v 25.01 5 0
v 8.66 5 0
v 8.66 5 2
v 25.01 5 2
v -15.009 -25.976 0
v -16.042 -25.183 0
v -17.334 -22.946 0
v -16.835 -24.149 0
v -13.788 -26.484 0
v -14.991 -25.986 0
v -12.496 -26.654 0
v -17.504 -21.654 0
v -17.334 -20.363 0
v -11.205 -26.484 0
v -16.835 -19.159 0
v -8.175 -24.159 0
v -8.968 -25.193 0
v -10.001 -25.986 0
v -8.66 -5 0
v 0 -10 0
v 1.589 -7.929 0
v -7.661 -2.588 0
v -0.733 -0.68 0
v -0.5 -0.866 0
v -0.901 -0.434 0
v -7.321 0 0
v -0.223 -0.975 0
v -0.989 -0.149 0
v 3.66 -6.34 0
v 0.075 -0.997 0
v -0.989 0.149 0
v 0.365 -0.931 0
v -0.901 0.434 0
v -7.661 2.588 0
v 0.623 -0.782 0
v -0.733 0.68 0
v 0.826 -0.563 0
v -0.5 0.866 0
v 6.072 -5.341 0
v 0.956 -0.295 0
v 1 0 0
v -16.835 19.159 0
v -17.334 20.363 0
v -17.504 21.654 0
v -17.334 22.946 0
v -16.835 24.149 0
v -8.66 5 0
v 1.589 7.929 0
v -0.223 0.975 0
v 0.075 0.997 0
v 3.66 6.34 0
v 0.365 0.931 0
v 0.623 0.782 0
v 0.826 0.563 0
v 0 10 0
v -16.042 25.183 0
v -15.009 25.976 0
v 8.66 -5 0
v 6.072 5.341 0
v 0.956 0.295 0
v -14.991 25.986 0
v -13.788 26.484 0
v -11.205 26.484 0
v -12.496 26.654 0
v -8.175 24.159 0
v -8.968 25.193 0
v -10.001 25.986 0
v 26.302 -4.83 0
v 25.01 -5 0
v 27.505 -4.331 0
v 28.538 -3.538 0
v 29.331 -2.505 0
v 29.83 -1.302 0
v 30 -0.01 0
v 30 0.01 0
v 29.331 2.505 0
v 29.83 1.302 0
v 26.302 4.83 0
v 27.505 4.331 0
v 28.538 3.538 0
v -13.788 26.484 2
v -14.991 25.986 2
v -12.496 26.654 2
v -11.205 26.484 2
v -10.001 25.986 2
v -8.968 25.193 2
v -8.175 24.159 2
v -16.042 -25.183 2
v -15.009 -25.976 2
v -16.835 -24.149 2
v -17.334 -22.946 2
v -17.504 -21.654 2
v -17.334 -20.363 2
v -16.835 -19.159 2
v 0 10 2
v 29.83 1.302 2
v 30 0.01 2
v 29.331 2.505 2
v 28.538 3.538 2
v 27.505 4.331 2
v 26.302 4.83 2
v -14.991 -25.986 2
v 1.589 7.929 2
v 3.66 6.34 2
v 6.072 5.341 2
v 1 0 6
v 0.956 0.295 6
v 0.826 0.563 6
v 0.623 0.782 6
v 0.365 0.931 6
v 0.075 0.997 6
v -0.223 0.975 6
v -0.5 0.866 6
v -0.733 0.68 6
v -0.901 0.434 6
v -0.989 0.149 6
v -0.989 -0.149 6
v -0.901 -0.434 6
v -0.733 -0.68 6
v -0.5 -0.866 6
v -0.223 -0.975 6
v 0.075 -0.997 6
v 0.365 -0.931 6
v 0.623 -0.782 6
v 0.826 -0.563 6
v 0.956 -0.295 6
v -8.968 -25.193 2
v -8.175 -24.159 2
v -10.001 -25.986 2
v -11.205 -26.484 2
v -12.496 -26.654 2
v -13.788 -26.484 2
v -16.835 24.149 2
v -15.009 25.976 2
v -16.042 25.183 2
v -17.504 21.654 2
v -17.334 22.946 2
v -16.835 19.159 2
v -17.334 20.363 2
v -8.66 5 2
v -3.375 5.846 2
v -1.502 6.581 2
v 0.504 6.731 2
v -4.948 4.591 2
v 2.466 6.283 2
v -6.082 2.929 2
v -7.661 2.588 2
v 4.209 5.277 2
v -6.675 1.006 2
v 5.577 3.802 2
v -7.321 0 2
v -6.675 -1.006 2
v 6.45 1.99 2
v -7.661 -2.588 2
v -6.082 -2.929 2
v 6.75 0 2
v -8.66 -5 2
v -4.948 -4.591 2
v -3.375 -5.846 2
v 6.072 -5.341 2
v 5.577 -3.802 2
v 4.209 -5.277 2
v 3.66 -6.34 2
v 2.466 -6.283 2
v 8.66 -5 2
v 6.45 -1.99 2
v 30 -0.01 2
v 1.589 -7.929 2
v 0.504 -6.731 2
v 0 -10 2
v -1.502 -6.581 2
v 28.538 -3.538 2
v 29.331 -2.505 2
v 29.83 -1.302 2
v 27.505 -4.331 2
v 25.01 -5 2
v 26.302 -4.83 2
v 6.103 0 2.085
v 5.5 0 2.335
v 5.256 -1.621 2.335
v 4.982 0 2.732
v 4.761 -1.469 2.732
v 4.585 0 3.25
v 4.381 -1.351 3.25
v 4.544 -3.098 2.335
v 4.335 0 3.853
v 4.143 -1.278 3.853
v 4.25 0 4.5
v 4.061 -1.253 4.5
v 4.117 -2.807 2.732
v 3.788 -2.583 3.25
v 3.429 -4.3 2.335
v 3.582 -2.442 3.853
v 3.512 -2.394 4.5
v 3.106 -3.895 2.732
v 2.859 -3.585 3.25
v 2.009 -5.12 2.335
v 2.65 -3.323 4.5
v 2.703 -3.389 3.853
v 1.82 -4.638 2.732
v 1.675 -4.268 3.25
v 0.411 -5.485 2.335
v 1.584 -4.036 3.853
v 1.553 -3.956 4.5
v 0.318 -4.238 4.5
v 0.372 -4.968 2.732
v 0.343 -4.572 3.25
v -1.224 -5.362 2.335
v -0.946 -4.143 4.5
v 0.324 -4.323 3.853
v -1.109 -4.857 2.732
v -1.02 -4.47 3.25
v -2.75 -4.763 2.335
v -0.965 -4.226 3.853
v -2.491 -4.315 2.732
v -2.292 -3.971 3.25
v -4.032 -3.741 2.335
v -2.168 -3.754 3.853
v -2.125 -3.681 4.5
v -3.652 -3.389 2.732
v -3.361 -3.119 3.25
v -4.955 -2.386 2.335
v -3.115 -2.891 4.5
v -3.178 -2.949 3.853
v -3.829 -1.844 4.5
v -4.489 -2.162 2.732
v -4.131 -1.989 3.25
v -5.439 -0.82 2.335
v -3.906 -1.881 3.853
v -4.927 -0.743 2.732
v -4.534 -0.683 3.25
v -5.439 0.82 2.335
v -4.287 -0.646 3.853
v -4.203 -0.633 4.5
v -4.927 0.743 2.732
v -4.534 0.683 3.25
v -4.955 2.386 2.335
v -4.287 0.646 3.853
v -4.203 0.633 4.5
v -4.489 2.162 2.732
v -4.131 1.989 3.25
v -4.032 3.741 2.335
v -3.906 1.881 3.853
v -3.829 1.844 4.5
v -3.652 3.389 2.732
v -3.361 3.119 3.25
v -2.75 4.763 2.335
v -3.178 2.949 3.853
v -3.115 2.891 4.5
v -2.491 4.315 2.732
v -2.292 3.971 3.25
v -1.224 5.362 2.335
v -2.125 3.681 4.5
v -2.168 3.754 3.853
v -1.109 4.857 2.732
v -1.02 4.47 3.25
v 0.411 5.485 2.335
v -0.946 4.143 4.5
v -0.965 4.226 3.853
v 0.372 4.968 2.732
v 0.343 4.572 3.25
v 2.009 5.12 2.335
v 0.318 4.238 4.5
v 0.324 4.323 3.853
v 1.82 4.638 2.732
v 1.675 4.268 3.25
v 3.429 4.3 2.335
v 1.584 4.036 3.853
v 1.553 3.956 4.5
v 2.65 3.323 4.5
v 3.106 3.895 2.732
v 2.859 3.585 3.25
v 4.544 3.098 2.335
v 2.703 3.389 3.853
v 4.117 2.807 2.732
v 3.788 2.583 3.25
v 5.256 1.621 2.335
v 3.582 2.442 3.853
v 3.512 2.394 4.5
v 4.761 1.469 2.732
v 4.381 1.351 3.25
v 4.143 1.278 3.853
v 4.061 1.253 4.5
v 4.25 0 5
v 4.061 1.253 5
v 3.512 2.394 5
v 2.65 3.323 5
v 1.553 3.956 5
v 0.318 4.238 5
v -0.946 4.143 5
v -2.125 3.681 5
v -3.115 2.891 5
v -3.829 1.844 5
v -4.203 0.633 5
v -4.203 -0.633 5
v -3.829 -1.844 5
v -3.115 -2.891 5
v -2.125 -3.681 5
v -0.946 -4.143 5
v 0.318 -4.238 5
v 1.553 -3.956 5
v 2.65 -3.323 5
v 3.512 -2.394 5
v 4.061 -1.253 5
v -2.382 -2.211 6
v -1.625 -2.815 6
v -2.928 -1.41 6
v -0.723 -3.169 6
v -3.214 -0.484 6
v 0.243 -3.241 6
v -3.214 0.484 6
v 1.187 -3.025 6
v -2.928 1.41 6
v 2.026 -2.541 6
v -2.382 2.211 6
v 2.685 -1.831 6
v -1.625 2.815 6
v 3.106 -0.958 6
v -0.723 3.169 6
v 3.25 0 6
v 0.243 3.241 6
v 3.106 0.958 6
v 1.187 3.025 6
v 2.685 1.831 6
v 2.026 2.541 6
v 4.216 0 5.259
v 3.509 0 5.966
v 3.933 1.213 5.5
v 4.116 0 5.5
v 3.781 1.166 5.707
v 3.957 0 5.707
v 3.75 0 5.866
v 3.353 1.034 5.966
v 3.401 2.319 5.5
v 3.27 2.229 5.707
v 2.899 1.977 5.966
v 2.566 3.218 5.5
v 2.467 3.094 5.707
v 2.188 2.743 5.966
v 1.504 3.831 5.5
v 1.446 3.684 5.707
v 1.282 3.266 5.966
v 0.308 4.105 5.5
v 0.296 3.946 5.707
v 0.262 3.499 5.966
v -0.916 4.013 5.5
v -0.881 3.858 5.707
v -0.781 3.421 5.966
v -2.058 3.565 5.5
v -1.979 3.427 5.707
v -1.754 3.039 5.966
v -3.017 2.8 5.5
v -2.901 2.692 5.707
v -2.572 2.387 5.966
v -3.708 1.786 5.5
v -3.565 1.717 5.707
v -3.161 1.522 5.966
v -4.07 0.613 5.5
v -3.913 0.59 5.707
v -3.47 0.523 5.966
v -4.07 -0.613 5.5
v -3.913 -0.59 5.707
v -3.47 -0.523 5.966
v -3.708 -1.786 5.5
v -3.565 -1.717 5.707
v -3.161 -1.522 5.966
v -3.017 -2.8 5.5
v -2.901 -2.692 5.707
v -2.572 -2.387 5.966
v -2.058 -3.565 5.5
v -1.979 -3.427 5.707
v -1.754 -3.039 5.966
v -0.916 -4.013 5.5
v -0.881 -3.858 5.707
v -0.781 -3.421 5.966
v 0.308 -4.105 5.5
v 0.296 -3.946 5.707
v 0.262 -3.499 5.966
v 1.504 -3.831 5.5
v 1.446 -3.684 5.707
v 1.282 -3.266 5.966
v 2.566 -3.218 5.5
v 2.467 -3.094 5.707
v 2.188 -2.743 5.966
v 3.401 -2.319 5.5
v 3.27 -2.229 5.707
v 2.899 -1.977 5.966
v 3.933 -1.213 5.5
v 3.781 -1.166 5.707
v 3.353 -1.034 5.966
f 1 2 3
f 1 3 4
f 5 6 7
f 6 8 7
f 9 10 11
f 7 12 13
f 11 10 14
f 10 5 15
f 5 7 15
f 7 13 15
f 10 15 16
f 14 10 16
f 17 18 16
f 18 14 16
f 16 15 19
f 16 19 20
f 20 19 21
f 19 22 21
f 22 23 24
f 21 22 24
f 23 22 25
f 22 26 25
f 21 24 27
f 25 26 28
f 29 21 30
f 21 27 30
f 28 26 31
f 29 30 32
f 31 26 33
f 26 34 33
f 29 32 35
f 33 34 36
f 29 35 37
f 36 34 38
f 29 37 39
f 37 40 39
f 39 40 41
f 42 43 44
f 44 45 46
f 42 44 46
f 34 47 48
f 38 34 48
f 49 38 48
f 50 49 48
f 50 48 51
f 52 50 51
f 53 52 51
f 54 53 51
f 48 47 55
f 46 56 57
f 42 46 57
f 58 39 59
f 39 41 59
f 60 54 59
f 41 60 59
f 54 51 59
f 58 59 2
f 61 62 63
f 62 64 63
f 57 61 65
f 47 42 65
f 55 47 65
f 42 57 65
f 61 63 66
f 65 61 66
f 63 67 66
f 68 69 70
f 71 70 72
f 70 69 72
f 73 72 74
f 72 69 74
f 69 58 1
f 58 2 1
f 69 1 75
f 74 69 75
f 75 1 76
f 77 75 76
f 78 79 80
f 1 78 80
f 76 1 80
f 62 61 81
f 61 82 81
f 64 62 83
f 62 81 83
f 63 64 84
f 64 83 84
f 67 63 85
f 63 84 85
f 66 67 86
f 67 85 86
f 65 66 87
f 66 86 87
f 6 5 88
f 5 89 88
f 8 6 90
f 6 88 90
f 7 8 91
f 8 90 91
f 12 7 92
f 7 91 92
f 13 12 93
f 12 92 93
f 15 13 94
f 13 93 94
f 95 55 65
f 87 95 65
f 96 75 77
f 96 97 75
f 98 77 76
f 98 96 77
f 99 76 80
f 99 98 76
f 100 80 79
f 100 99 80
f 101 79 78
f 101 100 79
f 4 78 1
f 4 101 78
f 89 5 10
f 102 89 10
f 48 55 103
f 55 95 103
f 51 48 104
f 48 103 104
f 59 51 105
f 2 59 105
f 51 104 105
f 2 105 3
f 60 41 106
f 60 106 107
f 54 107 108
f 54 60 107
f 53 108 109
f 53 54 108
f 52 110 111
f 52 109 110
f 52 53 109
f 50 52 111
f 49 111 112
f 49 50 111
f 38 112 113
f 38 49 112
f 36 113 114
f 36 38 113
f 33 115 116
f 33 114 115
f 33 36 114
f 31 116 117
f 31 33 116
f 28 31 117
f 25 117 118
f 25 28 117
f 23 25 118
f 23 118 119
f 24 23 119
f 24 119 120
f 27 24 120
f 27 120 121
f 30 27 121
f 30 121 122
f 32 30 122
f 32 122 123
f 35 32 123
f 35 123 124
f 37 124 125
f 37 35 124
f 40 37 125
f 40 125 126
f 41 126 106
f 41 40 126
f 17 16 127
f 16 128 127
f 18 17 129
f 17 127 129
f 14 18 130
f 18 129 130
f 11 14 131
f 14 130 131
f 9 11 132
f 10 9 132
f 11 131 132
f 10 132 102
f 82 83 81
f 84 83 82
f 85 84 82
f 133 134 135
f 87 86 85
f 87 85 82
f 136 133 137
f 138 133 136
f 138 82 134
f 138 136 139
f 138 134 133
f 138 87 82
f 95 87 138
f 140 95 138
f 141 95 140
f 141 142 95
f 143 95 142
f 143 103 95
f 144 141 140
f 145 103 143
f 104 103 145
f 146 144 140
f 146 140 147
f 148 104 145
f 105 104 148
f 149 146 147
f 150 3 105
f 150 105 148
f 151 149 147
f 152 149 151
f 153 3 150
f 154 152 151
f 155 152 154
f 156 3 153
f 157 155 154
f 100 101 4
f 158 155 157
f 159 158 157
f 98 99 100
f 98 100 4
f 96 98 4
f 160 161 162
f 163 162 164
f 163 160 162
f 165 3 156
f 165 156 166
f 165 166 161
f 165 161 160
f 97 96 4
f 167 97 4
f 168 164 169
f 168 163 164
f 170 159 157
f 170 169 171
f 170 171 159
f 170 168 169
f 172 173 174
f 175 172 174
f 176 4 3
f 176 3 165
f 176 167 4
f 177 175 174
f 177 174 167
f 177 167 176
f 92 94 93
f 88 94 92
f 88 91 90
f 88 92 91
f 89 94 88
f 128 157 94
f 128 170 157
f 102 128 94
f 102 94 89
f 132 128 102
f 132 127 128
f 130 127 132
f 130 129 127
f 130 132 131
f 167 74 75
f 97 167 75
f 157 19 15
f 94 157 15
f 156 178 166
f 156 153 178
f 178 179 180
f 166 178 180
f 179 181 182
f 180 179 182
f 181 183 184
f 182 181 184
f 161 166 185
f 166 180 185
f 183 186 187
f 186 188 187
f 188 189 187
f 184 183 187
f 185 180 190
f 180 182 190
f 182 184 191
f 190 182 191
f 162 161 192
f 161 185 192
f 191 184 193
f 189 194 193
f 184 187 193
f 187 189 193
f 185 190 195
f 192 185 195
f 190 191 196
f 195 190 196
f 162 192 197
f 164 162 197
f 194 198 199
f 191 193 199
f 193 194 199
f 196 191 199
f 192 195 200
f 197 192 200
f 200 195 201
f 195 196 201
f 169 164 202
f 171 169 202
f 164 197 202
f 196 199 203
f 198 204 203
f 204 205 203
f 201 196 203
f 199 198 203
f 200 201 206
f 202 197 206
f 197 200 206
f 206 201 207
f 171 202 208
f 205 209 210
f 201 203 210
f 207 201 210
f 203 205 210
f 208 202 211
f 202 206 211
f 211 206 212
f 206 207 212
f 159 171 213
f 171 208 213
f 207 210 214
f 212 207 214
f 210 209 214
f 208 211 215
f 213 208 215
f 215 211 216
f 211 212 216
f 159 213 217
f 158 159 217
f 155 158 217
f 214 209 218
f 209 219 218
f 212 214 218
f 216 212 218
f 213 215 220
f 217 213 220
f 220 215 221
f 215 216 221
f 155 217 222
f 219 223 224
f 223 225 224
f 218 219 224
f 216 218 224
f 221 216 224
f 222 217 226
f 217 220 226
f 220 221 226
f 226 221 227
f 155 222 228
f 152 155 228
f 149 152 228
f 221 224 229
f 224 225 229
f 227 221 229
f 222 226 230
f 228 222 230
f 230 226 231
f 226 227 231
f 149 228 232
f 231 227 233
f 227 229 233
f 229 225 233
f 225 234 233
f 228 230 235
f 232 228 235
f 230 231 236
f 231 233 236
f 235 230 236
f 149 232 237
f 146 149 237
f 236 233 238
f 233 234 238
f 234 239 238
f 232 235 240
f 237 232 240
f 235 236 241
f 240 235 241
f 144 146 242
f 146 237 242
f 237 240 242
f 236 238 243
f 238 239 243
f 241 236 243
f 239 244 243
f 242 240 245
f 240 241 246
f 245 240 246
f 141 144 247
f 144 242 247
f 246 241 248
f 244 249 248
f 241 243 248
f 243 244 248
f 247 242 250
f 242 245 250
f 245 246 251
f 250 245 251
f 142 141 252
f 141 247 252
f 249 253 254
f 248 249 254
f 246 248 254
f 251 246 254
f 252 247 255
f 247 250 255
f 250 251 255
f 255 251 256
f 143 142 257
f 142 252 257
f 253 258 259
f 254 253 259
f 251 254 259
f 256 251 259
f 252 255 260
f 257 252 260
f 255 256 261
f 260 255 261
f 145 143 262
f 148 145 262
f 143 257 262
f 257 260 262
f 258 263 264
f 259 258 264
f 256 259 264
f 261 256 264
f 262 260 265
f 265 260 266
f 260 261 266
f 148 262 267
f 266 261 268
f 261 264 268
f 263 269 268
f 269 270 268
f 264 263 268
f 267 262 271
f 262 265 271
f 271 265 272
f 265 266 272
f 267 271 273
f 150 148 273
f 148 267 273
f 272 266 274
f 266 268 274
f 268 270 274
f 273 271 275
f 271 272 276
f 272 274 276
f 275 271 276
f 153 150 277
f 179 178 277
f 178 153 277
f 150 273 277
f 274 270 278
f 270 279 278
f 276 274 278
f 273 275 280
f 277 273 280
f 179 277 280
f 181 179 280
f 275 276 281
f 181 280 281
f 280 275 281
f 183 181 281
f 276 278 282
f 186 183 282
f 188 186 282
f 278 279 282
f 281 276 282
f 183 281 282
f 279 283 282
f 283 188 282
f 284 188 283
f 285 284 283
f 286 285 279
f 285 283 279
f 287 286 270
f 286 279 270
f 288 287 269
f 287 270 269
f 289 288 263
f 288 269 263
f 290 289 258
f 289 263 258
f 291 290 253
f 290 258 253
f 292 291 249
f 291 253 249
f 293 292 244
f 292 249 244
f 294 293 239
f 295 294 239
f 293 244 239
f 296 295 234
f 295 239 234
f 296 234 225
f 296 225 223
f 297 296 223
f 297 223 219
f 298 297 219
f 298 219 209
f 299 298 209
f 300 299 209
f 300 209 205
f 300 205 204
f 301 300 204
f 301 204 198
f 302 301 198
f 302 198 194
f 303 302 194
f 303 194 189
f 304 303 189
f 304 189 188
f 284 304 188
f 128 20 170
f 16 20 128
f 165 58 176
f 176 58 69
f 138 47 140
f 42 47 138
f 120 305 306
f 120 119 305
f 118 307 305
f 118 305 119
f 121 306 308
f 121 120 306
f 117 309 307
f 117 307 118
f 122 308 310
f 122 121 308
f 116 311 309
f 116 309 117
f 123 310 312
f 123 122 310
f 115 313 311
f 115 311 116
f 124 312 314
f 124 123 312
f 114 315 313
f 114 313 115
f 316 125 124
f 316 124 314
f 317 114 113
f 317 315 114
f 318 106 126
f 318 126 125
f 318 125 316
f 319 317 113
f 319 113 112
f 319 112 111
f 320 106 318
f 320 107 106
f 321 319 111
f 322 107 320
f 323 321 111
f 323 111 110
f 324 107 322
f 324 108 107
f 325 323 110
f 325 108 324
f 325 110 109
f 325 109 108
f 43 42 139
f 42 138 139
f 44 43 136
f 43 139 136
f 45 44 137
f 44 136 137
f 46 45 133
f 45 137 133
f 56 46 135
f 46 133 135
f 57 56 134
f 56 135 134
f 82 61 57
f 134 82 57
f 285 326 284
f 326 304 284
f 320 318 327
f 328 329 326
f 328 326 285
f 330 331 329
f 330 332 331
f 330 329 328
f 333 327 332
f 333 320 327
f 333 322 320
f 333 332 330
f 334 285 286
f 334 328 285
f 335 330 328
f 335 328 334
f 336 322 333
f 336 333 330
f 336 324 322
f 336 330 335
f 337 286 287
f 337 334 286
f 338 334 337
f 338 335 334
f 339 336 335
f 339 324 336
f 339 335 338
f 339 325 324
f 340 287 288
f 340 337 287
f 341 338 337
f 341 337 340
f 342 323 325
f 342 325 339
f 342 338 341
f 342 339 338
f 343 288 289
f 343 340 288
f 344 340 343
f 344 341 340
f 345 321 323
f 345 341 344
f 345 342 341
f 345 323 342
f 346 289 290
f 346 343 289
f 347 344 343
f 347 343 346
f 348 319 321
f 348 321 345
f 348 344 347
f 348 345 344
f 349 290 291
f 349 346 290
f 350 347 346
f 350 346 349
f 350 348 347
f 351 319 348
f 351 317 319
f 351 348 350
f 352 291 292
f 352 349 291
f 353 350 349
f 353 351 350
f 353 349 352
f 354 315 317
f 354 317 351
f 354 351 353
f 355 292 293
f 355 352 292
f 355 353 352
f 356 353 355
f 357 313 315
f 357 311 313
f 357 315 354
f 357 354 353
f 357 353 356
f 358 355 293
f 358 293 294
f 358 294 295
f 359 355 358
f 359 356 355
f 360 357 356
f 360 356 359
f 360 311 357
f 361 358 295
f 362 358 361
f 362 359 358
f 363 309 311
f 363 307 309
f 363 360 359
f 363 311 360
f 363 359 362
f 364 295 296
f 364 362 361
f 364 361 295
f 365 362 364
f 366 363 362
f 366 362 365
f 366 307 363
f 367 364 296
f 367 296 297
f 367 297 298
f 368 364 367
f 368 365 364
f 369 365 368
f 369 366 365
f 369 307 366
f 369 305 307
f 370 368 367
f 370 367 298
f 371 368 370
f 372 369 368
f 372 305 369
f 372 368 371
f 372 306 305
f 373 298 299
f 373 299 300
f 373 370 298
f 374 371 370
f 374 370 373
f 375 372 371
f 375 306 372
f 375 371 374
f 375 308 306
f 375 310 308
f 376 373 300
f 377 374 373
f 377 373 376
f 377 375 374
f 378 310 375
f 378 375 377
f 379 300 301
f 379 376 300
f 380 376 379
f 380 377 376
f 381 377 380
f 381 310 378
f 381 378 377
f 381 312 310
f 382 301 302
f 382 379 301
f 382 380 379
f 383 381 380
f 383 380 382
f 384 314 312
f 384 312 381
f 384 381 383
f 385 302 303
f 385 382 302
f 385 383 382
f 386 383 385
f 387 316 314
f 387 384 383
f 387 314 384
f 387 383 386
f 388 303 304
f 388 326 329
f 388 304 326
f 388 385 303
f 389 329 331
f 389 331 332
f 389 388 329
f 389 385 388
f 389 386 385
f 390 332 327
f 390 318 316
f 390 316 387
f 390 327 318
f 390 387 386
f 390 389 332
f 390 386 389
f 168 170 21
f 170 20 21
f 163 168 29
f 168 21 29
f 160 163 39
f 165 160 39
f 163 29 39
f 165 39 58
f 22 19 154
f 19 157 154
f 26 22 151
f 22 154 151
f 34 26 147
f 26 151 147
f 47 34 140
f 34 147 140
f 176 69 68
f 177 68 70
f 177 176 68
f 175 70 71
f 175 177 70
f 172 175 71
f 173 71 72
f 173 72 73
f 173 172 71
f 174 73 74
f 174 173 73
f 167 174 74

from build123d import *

# Parameters (mm, degrees)
CYLINDER_R        = 1
CYLINDER_DEPTH    = 10
CYLINDER001_R     = 4.25
CYLINDER001_DEPTH = 6
BOX_W             = 30
BOX_H             = 10
BOX_DEPTH         = 2
ARRAY_COUNT       = 3
FILLET_1_R        = 10
FILLET_2_R        = 4.99
FILLET001_1_R     = 2.5
FILLET001_2_R     = 1


with BuildPart() as hueco_eje_central:
    # Cylinder → Cylinder (new body)
    with BuildSketch(Plane.XY.offset(-2)):
        Circle(CYLINDER_R)
    extrude(amount=CYLINDER_DEPTH)


with BuildPart() as cilindro_base_soporte:
    # Cylinder001 → Cylinder001 (new body)
    with BuildSketch(Plane.XY):
        Circle(CYLINDER001_R)
    extrude(amount=CYLINDER001_DEPTH)


with BuildPart() as pala_triple_r30:
    # Box → Box (new body)
    with BuildSketch(Plane(origin=(0, -5, 0), x_dir=(1, 0, 0), z_dir=(0, 0, 1))):
        with Locations((15, 5)):
            Rectangle(BOX_W, BOX_H)
    extrude(amount=BOX_DEPTH)

    # Array: Pala triple R30 ×3 about axis
    array_axis = Axis((0, 0, 0), (0, 0, 1))


with BuildPart() as pala_triple_r30_1:
    add(pala_triple_r30.part)
    for i in range(1, ARRAY_COUNT):
        add(pala_triple_r30.part.rotate(array_axis, i * 360 / ARRAY_COUNT))

    # Fillet 1
    fillet_1_edges = [pala_triple_r30_1.edges().sort_by_distance(p)[0] for p in [
        (2.886751, -5, 1),
        (2.886751, 5, 1),
        (-5.773503, 0, 1),
    ]]
    fillet(fillet_1_edges, radius=FILLET_1_R)

    # Fillet 2
    fillet_2_edges = [pala_triple_r30_1.edges().sort_by_distance(p)[0] for p in [
        (30, -5, 1),
        (30, 5, 1),
        (-10.669873, -28.480762, 1),
        (-10.669873, 28.480762, 1),
        (-19.330127, -23.480762, 1),
        (-19.330127, 23.480762, 1),
    ]]
    fillet(fillet_2_edges, radius=FILLET_2_R)

    # Fusion001: union Cilindro base soporte
    add(cilindro_base_soporte.part)

    # Fillet001 1
    fillet001_1_edges = [pala_triple_r30_1.edges().sort_by_distance(p)[0] for p in [
        (-4.25, 0, 2),
    ]]
    fillet(fillet001_1_edges, radius=FILLET001_1_R)

    # Fillet001 2
    fillet001_2_edges = [pala_triple_r30_1.edges().sort_by_distance(p)[0] for p in [
        (-4.25, 0, 6),
    ]]
    fillet(fillet001_2_edges, radius=FILLET001_2_R)

    # Cut: cut hueco eje central
    add(hueco_eje_central.part, mode=Mode.SUBTRACT)


solid = pala_triple_r30_1.part
